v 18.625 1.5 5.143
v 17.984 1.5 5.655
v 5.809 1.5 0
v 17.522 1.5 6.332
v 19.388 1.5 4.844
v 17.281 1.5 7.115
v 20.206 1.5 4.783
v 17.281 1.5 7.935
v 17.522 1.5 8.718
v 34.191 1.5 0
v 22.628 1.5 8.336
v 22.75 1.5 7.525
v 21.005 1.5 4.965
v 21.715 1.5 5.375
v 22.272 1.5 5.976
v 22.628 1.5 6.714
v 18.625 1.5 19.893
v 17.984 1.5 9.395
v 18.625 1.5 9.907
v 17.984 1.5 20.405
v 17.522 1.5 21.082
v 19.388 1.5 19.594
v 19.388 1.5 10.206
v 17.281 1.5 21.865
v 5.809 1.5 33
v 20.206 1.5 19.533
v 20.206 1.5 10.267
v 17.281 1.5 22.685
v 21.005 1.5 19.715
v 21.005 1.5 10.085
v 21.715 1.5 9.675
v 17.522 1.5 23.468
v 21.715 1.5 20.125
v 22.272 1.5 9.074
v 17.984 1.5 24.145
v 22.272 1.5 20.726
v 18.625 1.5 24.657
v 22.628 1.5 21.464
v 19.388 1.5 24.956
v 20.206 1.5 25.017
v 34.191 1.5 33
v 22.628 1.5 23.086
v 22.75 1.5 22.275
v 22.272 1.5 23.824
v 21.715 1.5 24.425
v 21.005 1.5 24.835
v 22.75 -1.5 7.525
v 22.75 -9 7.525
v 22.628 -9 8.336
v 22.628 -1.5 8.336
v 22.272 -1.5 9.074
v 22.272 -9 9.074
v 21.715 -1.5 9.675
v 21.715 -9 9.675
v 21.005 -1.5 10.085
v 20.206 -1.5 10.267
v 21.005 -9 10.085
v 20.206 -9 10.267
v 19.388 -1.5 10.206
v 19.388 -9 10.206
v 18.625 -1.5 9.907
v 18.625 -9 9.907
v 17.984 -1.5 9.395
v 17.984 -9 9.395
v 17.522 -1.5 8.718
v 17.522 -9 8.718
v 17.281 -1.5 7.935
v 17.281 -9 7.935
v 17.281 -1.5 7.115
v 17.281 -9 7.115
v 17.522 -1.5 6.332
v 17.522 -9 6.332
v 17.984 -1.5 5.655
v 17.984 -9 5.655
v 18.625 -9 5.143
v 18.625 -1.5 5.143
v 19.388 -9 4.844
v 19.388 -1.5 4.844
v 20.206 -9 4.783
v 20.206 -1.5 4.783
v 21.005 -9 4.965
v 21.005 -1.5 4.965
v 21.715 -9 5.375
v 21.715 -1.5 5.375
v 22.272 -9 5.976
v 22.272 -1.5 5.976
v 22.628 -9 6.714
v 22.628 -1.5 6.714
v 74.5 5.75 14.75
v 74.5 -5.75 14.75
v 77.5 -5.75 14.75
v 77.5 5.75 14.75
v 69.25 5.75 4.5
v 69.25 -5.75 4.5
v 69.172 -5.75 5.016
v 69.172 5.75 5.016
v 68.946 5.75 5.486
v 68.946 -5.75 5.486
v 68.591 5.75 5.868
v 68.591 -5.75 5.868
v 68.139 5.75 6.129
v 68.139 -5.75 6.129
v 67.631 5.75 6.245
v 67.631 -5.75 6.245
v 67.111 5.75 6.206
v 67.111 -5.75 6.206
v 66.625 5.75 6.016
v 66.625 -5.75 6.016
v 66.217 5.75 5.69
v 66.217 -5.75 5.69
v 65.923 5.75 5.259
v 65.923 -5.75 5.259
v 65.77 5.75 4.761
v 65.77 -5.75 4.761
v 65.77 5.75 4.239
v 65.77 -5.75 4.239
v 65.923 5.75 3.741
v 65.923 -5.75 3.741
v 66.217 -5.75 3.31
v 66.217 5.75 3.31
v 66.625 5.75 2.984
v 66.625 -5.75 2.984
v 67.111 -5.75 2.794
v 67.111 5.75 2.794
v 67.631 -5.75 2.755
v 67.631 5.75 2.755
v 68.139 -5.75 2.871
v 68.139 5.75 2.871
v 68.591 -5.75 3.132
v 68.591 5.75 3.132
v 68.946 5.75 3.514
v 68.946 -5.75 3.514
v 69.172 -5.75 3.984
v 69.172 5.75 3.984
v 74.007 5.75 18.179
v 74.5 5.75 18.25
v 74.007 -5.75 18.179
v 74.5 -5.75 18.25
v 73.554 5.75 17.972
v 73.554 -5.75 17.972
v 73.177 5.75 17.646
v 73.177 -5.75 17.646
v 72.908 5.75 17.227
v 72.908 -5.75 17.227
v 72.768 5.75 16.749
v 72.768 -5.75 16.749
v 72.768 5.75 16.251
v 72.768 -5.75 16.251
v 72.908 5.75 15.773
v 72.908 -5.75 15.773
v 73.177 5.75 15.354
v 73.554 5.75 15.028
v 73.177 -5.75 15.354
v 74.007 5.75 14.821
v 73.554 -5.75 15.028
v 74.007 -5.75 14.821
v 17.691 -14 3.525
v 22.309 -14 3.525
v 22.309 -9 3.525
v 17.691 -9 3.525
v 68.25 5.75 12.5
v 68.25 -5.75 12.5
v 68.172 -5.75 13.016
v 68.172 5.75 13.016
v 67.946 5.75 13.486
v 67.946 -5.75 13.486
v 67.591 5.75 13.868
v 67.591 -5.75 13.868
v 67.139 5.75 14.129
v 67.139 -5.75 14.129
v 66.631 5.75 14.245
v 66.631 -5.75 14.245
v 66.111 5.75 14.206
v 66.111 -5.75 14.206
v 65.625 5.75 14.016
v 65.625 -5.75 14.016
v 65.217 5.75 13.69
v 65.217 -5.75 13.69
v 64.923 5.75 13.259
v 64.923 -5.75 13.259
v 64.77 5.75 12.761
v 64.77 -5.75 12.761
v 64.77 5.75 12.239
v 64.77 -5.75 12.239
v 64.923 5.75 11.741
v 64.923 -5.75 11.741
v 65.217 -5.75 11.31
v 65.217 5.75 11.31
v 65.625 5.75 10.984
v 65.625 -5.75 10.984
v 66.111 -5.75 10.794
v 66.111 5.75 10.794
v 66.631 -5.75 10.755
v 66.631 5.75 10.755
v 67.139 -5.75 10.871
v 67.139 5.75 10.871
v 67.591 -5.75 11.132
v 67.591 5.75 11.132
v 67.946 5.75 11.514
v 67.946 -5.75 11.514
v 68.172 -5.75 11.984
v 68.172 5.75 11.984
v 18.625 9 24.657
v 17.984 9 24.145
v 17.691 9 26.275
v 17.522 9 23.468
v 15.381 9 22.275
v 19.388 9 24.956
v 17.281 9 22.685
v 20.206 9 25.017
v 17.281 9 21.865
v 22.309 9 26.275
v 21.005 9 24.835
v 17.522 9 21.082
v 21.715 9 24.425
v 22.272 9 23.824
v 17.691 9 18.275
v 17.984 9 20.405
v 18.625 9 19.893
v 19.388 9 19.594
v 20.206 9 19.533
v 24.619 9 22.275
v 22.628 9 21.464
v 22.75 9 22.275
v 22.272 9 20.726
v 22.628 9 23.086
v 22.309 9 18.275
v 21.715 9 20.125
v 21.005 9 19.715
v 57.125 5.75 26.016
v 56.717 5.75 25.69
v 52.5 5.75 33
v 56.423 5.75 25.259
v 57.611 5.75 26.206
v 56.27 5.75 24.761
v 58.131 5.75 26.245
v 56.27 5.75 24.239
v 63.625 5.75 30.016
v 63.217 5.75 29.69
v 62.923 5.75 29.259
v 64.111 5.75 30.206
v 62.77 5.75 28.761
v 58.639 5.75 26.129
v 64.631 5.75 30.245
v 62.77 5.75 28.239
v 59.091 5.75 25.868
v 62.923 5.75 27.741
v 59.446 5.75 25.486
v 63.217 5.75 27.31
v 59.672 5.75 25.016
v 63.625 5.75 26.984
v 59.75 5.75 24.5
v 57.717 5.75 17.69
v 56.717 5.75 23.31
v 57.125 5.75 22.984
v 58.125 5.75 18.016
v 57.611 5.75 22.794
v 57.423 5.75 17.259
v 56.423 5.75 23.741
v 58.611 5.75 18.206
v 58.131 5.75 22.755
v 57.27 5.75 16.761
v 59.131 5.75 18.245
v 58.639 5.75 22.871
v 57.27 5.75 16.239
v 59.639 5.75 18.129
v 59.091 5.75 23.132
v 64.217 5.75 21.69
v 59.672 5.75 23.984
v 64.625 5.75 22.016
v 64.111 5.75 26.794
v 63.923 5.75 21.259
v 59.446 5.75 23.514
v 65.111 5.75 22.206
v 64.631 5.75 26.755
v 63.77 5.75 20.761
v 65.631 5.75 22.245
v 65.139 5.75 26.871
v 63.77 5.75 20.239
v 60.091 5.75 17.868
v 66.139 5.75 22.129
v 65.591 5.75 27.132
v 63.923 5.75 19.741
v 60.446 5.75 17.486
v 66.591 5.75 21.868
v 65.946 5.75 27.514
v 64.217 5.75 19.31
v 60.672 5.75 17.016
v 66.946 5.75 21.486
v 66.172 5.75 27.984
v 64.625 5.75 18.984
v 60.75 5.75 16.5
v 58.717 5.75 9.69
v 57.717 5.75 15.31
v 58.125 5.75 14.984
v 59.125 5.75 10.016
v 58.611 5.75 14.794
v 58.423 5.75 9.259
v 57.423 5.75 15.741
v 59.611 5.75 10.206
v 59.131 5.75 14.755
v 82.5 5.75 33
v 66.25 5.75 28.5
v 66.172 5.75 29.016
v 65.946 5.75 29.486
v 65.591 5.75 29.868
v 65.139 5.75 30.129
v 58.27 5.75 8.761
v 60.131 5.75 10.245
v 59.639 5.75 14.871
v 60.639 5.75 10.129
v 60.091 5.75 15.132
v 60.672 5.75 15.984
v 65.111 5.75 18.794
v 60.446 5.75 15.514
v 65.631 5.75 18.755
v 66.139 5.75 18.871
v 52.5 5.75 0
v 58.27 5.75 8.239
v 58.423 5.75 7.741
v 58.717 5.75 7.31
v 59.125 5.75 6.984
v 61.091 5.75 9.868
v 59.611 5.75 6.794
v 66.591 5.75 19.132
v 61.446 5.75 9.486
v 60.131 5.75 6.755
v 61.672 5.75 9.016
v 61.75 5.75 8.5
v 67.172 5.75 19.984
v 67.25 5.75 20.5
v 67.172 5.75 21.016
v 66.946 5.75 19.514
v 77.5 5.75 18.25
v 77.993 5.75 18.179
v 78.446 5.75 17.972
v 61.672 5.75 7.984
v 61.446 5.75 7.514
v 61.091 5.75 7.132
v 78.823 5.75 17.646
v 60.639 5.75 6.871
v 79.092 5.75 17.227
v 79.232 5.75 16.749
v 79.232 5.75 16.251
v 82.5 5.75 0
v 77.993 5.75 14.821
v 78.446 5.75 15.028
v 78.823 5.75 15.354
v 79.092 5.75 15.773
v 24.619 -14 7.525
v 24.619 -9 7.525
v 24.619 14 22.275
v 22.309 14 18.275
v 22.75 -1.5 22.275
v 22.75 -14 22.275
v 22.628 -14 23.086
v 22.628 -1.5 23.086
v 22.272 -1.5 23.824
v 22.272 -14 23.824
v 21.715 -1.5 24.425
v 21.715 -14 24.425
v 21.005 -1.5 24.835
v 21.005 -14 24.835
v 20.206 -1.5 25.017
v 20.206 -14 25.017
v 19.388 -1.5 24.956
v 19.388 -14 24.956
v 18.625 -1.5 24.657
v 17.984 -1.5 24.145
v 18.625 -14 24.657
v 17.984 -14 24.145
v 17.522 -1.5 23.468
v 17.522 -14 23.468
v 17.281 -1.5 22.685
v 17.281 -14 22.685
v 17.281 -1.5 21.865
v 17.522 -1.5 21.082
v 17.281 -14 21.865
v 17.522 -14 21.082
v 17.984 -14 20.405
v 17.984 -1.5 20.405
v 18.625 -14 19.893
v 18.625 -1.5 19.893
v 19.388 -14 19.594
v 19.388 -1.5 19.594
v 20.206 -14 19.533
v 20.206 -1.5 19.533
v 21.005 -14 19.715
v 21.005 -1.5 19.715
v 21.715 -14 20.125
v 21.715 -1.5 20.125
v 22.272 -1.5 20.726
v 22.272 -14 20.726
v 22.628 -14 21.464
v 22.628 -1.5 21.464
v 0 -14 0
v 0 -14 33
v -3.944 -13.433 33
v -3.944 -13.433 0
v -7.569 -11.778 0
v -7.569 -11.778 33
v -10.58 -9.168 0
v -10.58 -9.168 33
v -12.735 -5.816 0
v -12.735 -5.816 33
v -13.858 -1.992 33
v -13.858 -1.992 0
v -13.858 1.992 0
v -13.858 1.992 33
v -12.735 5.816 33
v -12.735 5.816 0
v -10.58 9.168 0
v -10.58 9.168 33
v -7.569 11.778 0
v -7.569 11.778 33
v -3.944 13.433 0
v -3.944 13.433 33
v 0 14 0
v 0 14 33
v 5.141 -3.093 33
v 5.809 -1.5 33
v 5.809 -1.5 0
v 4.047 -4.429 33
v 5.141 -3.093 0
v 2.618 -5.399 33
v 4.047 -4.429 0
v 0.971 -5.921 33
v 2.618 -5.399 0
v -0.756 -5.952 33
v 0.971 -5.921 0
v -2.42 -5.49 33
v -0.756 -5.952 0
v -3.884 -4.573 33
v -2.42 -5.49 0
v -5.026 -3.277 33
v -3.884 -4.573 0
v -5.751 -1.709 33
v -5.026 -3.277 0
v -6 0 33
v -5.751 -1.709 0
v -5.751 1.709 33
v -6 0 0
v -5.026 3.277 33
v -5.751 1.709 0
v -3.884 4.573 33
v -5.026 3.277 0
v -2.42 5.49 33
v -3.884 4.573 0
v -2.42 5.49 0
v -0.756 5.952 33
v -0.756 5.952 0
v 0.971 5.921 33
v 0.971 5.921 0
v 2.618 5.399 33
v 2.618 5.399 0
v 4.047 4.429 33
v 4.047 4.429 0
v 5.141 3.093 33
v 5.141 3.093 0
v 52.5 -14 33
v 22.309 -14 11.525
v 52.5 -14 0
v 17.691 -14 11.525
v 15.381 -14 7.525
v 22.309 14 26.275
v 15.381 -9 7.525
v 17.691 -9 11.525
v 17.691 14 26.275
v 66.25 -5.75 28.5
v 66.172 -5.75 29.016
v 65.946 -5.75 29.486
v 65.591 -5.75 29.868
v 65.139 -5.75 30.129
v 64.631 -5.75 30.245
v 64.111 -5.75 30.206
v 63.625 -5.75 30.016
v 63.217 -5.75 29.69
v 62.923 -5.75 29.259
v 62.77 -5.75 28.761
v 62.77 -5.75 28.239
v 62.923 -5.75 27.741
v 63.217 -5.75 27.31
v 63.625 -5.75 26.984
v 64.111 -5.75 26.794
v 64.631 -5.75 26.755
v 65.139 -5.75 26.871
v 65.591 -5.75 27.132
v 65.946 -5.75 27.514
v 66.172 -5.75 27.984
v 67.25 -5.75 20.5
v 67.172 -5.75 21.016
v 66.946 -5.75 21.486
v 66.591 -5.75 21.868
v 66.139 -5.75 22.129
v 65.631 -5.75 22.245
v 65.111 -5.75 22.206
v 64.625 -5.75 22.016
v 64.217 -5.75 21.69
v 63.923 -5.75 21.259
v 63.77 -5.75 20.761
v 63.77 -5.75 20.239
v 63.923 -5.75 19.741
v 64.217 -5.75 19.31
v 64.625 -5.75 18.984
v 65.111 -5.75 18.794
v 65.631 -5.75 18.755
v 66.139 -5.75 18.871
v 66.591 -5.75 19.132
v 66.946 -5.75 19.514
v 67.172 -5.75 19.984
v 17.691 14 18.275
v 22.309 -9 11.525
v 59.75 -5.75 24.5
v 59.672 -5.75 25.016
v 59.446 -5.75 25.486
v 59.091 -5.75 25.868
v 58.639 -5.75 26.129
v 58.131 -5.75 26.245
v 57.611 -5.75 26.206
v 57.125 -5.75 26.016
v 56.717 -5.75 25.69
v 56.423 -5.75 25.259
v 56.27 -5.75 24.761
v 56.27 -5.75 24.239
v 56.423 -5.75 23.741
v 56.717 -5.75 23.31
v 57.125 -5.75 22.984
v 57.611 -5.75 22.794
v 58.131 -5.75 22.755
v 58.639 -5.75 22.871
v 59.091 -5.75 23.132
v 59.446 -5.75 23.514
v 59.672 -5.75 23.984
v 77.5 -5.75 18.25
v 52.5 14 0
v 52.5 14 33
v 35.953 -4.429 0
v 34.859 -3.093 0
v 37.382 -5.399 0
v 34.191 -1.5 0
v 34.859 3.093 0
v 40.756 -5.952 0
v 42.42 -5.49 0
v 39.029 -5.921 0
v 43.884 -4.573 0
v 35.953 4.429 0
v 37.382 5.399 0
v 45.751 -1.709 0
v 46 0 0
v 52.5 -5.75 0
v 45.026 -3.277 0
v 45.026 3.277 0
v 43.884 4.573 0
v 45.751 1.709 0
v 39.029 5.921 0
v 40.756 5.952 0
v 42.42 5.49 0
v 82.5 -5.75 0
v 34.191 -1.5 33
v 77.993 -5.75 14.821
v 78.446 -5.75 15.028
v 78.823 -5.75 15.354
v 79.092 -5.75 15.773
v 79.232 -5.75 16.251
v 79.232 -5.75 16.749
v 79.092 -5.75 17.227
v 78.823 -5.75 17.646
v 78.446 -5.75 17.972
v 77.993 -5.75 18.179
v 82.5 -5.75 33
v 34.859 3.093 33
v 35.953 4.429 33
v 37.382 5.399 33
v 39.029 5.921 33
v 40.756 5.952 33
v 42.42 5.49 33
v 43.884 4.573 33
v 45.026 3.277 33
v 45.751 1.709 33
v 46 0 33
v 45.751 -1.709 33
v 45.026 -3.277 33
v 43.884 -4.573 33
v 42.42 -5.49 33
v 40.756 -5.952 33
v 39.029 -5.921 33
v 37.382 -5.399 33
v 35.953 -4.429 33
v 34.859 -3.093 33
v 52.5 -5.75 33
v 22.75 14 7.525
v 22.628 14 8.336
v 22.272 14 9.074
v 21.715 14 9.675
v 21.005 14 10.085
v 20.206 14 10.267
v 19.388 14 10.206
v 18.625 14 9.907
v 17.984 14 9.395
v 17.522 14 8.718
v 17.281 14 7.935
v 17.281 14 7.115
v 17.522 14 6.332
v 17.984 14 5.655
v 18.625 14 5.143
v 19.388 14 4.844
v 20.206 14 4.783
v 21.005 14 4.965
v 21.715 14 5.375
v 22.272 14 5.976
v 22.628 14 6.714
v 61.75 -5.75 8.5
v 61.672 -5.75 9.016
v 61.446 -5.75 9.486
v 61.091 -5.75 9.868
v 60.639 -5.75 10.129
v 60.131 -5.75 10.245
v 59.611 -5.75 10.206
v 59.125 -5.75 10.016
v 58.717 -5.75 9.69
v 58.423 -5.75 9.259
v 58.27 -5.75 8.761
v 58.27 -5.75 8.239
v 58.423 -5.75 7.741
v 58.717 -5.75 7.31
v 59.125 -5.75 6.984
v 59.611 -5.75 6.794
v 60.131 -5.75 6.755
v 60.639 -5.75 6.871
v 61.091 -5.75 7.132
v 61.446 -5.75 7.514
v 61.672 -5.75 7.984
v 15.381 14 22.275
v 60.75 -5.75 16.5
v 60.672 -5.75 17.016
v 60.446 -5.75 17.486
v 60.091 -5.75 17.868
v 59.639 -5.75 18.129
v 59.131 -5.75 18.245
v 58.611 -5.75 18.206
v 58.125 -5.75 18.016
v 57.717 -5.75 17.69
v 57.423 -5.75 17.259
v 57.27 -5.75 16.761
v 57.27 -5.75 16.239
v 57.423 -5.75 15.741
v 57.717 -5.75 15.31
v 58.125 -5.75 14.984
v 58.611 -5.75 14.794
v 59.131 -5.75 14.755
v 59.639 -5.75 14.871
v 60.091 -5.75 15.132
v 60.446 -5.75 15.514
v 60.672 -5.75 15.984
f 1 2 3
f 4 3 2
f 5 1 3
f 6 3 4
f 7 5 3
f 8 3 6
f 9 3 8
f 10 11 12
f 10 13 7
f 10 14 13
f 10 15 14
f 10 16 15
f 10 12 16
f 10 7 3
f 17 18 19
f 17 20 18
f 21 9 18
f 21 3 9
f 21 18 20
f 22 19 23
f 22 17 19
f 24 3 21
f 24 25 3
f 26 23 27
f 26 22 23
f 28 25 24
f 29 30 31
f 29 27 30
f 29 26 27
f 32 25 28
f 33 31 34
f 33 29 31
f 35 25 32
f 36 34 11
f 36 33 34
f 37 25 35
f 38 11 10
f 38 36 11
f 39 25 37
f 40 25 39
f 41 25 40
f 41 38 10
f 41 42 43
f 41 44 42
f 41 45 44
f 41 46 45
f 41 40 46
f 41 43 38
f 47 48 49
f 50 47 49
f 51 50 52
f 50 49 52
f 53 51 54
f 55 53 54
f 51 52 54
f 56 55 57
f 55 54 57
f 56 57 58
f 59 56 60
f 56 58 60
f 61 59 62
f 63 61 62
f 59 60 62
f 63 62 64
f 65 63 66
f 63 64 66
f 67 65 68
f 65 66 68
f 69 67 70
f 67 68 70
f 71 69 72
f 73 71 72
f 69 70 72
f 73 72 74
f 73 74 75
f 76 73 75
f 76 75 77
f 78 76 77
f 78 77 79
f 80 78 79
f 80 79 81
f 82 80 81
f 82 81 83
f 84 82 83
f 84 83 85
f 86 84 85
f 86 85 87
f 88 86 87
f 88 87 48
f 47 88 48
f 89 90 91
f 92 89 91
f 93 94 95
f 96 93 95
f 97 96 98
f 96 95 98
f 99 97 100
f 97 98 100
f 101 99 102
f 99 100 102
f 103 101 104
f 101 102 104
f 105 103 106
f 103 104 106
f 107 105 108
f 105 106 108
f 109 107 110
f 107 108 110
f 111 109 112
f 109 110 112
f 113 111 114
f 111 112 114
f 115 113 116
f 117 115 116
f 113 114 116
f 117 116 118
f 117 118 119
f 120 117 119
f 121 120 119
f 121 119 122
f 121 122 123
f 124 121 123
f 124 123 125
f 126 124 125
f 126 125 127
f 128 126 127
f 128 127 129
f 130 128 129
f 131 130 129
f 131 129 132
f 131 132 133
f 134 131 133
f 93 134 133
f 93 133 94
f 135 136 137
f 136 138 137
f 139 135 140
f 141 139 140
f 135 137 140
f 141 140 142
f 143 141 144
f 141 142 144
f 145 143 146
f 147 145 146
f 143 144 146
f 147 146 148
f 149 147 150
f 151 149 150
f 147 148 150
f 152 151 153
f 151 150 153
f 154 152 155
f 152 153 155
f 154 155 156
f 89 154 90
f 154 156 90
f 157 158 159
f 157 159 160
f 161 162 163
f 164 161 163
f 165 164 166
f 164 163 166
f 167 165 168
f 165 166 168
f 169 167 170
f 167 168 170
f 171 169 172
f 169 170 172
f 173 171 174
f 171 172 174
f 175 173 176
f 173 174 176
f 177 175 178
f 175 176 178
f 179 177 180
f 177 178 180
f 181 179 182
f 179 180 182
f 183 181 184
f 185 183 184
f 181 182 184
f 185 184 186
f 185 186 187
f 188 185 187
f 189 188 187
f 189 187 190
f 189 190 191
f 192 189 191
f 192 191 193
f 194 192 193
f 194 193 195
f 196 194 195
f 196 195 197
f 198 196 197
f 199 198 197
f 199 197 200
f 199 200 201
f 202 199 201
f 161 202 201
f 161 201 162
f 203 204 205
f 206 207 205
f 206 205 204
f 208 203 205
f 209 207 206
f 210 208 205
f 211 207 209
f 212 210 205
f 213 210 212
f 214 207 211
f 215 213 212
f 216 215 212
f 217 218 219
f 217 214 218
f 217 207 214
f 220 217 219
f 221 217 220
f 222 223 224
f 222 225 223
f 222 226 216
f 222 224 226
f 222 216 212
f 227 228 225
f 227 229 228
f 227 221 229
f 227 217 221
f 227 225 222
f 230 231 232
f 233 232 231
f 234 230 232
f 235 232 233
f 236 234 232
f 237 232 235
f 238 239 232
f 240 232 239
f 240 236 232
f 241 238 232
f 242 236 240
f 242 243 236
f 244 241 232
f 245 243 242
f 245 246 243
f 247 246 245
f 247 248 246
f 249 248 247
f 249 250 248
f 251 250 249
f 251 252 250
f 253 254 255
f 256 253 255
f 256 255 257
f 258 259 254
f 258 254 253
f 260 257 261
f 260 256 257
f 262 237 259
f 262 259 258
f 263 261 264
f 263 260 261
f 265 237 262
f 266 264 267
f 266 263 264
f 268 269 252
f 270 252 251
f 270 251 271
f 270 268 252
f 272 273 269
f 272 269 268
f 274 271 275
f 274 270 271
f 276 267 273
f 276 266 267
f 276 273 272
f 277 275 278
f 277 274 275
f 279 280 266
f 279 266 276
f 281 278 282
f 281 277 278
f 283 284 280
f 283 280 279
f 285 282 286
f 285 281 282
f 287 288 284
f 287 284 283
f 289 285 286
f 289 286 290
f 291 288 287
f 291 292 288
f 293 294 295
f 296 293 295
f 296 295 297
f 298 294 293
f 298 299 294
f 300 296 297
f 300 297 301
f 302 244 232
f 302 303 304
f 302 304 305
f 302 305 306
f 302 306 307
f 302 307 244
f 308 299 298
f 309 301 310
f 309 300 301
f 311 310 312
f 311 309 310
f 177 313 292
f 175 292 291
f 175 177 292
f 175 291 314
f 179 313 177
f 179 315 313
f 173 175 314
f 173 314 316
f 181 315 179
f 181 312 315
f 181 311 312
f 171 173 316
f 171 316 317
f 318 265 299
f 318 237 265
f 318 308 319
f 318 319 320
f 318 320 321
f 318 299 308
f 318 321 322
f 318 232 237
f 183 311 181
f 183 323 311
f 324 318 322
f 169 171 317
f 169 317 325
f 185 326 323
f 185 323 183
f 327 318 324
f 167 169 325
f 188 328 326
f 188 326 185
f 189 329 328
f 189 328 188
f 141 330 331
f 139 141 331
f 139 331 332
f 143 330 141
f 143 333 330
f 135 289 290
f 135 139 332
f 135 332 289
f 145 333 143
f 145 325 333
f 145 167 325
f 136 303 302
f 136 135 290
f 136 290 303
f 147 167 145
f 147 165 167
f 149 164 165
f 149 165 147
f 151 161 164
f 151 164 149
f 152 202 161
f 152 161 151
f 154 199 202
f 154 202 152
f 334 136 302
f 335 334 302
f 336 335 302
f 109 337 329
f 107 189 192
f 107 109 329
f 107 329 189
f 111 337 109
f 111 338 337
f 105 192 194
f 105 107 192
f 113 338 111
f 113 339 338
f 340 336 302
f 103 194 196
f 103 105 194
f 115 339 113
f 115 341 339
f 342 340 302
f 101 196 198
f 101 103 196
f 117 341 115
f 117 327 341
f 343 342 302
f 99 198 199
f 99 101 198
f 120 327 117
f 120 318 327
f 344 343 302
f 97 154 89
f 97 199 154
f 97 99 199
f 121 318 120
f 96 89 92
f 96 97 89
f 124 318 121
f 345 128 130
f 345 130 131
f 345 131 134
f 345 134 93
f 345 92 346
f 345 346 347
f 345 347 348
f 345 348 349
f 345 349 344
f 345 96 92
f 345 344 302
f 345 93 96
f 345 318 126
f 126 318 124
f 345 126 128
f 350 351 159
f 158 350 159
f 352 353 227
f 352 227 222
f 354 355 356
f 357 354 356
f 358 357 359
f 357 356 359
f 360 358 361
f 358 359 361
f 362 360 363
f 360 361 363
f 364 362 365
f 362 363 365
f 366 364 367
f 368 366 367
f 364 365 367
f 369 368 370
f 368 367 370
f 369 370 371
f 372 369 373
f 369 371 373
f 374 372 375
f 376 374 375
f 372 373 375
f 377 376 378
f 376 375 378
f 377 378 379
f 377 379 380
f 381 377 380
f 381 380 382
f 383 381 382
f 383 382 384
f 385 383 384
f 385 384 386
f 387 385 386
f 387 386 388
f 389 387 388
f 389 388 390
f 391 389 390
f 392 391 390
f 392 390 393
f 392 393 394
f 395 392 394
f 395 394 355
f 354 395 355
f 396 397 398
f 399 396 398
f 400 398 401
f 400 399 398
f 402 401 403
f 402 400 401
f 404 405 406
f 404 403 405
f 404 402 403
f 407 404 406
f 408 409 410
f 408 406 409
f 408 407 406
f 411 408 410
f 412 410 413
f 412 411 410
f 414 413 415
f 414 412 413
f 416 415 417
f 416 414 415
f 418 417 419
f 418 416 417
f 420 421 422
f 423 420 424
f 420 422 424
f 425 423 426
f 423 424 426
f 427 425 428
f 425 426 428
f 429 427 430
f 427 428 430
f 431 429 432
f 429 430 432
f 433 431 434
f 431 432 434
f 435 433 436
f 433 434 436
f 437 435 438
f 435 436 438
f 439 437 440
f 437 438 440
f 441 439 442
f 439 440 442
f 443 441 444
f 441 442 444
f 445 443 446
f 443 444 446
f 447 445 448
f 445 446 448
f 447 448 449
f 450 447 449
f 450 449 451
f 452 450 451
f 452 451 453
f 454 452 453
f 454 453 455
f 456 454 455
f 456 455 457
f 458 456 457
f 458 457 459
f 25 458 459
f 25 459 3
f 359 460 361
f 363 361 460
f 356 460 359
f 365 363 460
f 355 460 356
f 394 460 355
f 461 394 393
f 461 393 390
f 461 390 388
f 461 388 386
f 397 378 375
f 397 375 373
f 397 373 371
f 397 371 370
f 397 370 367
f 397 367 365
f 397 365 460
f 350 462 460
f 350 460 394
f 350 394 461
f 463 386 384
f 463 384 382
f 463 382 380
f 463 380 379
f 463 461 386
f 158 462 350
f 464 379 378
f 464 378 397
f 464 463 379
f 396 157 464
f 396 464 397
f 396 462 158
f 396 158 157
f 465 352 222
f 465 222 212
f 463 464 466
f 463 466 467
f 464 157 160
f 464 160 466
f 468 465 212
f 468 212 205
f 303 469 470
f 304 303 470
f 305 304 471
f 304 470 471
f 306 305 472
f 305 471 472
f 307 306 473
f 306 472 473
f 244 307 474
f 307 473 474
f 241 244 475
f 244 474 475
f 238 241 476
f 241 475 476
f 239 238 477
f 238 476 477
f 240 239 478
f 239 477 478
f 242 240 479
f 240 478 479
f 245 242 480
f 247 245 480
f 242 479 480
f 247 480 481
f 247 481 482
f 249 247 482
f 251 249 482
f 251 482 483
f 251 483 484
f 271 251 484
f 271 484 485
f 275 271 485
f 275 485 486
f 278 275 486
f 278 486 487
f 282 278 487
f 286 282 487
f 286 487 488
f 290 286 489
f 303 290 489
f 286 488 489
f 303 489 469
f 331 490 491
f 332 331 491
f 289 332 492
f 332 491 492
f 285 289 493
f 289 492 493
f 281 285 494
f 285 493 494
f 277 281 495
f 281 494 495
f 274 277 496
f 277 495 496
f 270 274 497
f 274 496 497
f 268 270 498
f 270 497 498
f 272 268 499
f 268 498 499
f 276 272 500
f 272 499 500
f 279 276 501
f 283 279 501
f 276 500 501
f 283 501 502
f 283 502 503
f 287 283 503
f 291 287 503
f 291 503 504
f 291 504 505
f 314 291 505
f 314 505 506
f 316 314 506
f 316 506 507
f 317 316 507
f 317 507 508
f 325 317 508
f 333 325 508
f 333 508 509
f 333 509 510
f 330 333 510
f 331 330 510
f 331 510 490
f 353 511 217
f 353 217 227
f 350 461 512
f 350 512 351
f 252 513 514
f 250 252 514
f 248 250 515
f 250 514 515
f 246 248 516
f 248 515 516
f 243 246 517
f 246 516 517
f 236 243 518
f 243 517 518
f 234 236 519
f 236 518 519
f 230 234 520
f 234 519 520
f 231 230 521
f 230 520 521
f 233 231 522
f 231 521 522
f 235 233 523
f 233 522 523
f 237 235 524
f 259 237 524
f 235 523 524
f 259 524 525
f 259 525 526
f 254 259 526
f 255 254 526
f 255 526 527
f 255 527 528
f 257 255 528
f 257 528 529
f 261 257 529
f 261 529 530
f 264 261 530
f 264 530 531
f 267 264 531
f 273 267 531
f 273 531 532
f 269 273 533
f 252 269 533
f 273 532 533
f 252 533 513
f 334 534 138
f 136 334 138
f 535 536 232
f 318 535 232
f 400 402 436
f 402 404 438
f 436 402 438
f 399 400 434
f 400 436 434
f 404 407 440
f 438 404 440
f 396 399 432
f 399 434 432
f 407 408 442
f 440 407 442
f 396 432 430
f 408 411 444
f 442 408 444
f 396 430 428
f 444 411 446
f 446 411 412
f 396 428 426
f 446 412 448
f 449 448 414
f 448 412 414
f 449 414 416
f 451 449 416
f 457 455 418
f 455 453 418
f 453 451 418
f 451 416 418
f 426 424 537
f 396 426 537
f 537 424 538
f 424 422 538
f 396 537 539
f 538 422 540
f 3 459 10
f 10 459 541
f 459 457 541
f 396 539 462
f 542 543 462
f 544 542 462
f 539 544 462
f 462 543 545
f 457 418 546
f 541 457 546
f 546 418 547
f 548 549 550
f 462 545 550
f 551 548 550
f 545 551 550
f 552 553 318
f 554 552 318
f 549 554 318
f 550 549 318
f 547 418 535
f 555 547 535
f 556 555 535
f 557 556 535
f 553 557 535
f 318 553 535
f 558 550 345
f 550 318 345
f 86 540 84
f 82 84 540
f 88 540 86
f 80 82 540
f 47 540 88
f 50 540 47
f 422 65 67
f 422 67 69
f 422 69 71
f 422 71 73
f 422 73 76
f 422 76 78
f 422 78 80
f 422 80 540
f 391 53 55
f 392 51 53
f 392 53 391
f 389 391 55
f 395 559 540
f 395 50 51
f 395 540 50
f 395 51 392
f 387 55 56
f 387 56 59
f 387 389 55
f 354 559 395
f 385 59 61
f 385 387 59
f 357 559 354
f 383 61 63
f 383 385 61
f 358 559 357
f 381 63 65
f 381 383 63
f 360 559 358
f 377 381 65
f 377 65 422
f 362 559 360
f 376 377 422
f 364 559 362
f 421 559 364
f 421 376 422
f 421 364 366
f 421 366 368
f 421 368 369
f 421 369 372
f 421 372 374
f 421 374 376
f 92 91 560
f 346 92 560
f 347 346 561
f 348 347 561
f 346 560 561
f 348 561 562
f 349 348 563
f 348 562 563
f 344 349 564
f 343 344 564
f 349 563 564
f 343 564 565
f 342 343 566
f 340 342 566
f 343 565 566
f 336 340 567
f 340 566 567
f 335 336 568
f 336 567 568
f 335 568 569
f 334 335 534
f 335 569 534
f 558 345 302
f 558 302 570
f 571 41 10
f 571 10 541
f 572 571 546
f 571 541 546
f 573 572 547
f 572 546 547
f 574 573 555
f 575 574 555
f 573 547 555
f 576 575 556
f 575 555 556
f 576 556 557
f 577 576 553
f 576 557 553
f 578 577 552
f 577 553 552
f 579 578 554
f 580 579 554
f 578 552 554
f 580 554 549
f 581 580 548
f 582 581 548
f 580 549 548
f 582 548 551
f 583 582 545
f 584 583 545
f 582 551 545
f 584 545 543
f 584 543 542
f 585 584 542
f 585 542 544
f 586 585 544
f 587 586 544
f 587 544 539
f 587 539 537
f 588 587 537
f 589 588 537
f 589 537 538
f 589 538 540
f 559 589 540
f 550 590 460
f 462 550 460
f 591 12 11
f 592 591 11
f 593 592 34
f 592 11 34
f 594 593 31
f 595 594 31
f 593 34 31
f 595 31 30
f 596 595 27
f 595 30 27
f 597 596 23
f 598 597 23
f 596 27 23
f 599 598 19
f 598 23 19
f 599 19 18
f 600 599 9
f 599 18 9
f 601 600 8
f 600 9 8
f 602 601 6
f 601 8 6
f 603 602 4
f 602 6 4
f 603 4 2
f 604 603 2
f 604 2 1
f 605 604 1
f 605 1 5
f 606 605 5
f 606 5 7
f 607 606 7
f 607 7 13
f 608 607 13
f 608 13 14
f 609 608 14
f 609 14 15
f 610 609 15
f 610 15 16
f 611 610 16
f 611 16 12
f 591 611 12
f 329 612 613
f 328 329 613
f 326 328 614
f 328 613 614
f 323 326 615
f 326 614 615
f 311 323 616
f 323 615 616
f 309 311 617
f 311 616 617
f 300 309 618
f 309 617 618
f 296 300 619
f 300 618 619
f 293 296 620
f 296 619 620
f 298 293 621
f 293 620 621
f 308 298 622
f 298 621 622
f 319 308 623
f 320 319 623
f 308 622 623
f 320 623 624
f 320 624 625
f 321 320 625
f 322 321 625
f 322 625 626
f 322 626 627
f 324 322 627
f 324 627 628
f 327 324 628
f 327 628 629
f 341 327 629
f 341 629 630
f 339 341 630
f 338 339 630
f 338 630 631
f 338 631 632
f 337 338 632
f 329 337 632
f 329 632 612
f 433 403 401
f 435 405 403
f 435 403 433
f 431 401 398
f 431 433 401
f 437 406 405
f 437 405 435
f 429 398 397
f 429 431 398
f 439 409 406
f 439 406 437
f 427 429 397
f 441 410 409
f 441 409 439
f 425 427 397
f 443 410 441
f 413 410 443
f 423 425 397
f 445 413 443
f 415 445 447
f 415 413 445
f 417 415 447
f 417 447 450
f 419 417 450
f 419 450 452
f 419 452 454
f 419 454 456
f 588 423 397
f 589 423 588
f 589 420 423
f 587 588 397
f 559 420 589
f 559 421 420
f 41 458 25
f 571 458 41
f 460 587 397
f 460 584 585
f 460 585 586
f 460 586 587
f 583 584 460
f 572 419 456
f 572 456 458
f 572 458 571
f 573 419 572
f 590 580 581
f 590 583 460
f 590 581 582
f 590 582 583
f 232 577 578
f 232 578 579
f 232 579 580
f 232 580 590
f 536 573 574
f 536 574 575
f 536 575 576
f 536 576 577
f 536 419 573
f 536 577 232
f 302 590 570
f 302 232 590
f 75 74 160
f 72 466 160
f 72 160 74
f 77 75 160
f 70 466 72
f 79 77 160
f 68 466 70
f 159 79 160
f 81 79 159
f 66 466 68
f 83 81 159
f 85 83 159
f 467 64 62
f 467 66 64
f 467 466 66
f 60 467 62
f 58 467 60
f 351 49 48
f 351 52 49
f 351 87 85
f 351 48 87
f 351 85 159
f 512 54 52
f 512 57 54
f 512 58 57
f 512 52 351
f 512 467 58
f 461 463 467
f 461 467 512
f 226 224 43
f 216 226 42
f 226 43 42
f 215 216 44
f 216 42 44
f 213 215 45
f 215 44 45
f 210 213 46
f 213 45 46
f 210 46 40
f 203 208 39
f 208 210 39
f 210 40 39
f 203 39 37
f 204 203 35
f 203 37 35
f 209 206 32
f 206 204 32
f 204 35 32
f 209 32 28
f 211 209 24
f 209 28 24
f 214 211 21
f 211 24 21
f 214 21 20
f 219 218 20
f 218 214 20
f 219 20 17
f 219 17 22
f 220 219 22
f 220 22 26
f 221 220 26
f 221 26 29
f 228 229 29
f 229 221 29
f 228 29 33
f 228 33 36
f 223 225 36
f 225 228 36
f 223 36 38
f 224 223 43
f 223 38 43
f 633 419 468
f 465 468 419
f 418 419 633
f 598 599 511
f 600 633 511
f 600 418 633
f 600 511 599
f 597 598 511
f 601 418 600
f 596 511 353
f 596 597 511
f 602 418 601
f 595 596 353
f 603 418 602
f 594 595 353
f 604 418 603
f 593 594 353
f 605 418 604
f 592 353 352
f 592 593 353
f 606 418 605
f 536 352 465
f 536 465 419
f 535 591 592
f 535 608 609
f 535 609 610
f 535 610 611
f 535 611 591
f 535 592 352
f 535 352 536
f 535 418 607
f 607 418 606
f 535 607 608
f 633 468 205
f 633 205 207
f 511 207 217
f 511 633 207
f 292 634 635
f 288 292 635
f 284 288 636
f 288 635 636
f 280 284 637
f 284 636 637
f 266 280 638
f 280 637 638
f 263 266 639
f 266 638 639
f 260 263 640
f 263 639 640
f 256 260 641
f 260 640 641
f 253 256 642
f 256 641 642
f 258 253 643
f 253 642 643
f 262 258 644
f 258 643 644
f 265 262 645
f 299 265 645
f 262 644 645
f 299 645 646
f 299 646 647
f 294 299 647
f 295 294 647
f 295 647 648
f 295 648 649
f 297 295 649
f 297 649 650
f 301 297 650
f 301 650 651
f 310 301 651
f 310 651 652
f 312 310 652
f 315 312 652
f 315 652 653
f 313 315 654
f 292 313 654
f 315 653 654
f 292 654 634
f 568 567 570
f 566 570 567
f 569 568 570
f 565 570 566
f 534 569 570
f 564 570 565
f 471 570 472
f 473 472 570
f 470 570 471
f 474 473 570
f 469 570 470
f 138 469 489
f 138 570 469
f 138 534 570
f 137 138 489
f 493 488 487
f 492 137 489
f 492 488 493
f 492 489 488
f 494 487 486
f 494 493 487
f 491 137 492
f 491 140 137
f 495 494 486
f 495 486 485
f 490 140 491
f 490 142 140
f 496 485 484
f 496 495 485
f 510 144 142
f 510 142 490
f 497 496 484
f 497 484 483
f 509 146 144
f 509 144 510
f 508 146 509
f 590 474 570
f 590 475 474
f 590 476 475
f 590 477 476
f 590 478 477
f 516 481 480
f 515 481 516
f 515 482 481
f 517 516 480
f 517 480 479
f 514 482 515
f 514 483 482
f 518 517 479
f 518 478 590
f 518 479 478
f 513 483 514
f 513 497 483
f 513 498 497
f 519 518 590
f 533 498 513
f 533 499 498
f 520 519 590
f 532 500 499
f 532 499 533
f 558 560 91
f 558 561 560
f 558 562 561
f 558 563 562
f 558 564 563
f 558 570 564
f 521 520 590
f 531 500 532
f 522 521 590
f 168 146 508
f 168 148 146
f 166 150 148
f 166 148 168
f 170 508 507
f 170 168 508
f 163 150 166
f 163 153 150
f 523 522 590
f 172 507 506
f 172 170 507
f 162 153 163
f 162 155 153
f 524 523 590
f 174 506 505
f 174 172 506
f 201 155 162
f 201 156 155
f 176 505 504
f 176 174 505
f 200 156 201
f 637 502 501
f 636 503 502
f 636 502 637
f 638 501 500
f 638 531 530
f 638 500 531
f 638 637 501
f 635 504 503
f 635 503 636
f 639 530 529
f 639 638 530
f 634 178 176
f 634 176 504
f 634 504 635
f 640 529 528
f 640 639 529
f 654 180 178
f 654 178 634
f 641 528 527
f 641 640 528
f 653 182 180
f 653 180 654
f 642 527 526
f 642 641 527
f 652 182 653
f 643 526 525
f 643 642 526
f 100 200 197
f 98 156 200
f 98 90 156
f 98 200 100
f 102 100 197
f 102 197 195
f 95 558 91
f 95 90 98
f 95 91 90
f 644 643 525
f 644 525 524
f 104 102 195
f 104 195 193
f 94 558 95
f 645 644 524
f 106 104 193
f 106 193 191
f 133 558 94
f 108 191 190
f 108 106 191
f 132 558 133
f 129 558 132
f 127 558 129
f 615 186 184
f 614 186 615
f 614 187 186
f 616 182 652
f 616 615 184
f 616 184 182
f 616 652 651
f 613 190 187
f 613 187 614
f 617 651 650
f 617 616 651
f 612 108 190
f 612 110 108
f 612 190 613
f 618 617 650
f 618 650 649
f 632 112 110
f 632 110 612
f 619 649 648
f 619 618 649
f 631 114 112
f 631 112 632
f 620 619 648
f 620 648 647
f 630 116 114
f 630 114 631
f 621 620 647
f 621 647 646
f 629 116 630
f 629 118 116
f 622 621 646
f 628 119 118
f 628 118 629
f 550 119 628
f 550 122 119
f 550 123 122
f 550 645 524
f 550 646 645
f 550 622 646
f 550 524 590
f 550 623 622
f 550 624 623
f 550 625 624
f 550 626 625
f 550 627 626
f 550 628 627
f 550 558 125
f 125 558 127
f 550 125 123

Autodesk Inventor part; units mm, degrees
ref_plane "YZ Plane" through (0, 0, 0) normal (1, 0, 0) x (0, 1, 0)
ref_plane "XZ Plane" through (0, 0, 0) normal (0, 1, 0) x (-1, 0, 0)
ref_plane "XY Plane" through (0, 0, 0) normal (0, 0, 1) x (1, 0, 0)
sketch "Sketch1" plane through (0, 0, 0) normal (0, 0, 1) x (1, 0, 0)
  line L0 (0, 14) -> (52.5, 14)
  line L1 (52.5, 14) -> (52.5, 5.75)
  line L2 (52.5, 5.75) -> (82.5, 5.75)
  line L3 (82.5, 5.75) -> (82.5, -5.75)
  line L4 (82.5, -5.75) -> (52.5, -5.75)
  line L5 (52.5, -5.75) -> (52.5, -14)
  line L6 (52.5, -14) -> (0, -14)
  arc A0 (0, 14) -> (0, -14) centre (0, 0) ccw
  dimension "d0" = 82.5
  dimension "d1" = 30
  dimension "d2" = 14
  dimension "d3" = 11.5
extrude "Extrusion1" add sketch "Sketch1" along normal blind 33
sketch "Sketch2" plane through (0, 0, 0) normal (0, 0, -1) x (-1, 0, 0)
  arc A0 (0, -14) -> (0, 14) centre (0, 0) ccw projected
  circle A1 centre (0, 0) radius 6
  circle A2 centre (-40, 0) radius 6
  dimension "d6" = 12
  dimension "d8" = 40
extrude "Extrusion2" cut sketch "Sketch2" against normal through all
sketch "Sketch3" plane through (52.5, -5.75, 0) normal (0, -1, 0) x (1, 0, 0)
  line L0 (30, 0) -> (30, 33) projected
  line L1 (0, 0) -> (0, 33) projected
  line L2 (25, 18.25) -> (22, 18.25)
  arc A0 (22, 18.25) -> (22, 14.75) centre (22, 16.5) ccw
  line L3 (22, 14.75) -> (25, 14.75)
  arc A1 (25, 14.75) -> (25, 18.25) centre (25, 16.5) ccw
  point P0 (-52.5, 0)
  point P1 (30, 16.5)
  dimension "d11" = 3
  dimension "d13" = 5
  dimension "d14" = 1.75
extrude "Extrusion3" cut sketch "Sketch3" against normal through all
sketch "Sketch4" plane through (52.5, -5.75, 0) normal (0, -1, 0) x (1, 0, 0)
  line L0 (0, 0) -> (0, 33) projected
  line L1 (5, 8.5) -> (5, 16.5) construction
  line L2 (5, 16.5) -> (5, 24.5) construction
  line L3 (12, 28.5) -> (12, 20.5) construction
  line L4 (12, 20.5) -> (12, 12.5) construction
  line L5 (12, 12.5) -> (12, 4.5) construction
  circle A0 centre (5, 8.5) radius 1.75 construction
  circle A1 centre (5, 16.5) radius 1.75 construction
  circle A2 centre (5, 24.5) radius 1.75 construction
  circle A3 centre (12, 28.5) radius 1.75
  circle A4 centre (12, 20.5) radius 1.75 construction
  circle A5 centre (12, 12.5) radius 1.75 construction
  circle A6 centre (12, 4.5) radius 1.75 construction
  line L6 (0, 0) -> (0, 33) projected
  circle A7 centre (5.5, 24.5) radius 1.75
  circle A8 centre (13, 20.5) radius 1.75
  circle A9 centre (6.5, 16.5) radius 1.75
  circle A10 centre (14, 12.5) radius 1.75
  circle A11 centre (7.5, 8.5) radius 1.75
  circle A12 centre (15, 4.5) radius 1.75
  point P0 (-52.5, 0)
  point P1 (12, 16.5)
  point P2 (0, 16.5)
  dimension "d17" = 5
  dimension "d18" = 7
  dimension "d19" = 3.5
  dimension "d20" = 8
  dimension "d21" = 0.5
  dimension "d22" = 1
  dimension "d23" = 1.5
  dimension "d24" = 2
  dimension "d25" = 2.5
  dimension "d26" = 3
extrude "Extrusion4" cut sketch "Sketch4" against normal through all
sketch "Sketch5" plane through (0, -14, 0) normal (0, -1, 0) x (1, 0, 0)
  line L0 (52.5, 0) -> (0, 0) projected
  line L1 (0, 33) -> (52.5, 33) projected
  line L2 (0, 0) -> (0, 33) projected
  line L3 (43, -22.7639) -> (43, 127.2361)
  line L4 (37, -22.7639) -> (37, 127.2361)
  line L5 (37, 33) -> (43, 33)
  line L6 (40, 33) -> (40, 0)
  line L7 (0, 14.9) -> (40, 14.9)
  line L8 (20, 14.9) -> (20, 22.275)
  circle A0 centre (20, 22.275) radius 2.75
  line L9 (20, 14.9) -> (20, 7.525)
  circle A1 centre (20, 7.525) radius 2.75
  dimension "d32" = 18.1
  dimension "d34" = 7.375
  dimension "d35" = 5.5
extrude "Extrusion5" cut sketch "Sketch5" against normal through all contours A1 | A0
sketch "Sketch6" plane through (0, 14, 0) normal (0, 1, 0) x (1, 0, 0)
  circle A0 centre (20, -22.275) radius 2.75 projected
  line L0 (22.3094, -18.275) -> (24.6188, -22.275)
  line L1 (24.6188, -22.275) -> (22.3094, -26.275)
  line L2 (22.3094, -26.275) -> (17.6906, -26.275)
  line L3 (17.6906, -26.275) -> (15.3812, -22.275)
  line L4 (15.3812, -22.275) -> (17.6906, -18.275)
  line L5 (17.6906, -18.275) -> (22.3094, -18.275)
  dimension "d38" = 8
extrude "Extrusion6" cut sketch "Sketch6" against normal blind 5
sketch "Sketch7" plane through (0, -14, 0) normal (0, -1, 0) x (1, 0, 0)
  circle A0 centre (20, 7.525) radius 2.75 projected
  line L0 (17.6906, 11.525) -> (22.3094, 11.525)
  line L1 (22.3094, 11.525) -> (24.6188, 7.525)
  line L2 (24.6188, 7.525) -> (22.3094, 3.525)
  line L3 (22.3094, 3.525) -> (17.6906, 3.525)
  line L4 (17.6906, 3.525) -> (15.3812, 7.525)
  line L5 (15.3812, 7.525) -> (17.6906, 11.525)
  dimension "d41" = 8
extrude "Extrusion7" cut sketch "Sketch7" against normal blind 5
sketch "Sketch8" plane through (0, 0, 33) normal (0, 0, 1) x (1, 0, 0)
  circle A0 centre (0, 0) radius 6 projected
  circle A1 centre (40, 0) radius 6 projected
  line L0 (0, 1.5) -> (40, 1.5)
  line L1 (40, 1.5) -> (40, -1.5)
  line L2 (40, -1.5) -> (0, -1.5)
  line L3 (0, -1.5) -> (0, 1.5)
  dimension "d44" = 3
extrude "Extrusion8" cut sketch "Sketch8" against normal through all contours A0 L2 L3 L0 | A0 L0 A1 L2 | L0 L1 L2 A1 picked at (2, 0) picked at (38.0071, -0.1683)
properties part number "distal arm end"
